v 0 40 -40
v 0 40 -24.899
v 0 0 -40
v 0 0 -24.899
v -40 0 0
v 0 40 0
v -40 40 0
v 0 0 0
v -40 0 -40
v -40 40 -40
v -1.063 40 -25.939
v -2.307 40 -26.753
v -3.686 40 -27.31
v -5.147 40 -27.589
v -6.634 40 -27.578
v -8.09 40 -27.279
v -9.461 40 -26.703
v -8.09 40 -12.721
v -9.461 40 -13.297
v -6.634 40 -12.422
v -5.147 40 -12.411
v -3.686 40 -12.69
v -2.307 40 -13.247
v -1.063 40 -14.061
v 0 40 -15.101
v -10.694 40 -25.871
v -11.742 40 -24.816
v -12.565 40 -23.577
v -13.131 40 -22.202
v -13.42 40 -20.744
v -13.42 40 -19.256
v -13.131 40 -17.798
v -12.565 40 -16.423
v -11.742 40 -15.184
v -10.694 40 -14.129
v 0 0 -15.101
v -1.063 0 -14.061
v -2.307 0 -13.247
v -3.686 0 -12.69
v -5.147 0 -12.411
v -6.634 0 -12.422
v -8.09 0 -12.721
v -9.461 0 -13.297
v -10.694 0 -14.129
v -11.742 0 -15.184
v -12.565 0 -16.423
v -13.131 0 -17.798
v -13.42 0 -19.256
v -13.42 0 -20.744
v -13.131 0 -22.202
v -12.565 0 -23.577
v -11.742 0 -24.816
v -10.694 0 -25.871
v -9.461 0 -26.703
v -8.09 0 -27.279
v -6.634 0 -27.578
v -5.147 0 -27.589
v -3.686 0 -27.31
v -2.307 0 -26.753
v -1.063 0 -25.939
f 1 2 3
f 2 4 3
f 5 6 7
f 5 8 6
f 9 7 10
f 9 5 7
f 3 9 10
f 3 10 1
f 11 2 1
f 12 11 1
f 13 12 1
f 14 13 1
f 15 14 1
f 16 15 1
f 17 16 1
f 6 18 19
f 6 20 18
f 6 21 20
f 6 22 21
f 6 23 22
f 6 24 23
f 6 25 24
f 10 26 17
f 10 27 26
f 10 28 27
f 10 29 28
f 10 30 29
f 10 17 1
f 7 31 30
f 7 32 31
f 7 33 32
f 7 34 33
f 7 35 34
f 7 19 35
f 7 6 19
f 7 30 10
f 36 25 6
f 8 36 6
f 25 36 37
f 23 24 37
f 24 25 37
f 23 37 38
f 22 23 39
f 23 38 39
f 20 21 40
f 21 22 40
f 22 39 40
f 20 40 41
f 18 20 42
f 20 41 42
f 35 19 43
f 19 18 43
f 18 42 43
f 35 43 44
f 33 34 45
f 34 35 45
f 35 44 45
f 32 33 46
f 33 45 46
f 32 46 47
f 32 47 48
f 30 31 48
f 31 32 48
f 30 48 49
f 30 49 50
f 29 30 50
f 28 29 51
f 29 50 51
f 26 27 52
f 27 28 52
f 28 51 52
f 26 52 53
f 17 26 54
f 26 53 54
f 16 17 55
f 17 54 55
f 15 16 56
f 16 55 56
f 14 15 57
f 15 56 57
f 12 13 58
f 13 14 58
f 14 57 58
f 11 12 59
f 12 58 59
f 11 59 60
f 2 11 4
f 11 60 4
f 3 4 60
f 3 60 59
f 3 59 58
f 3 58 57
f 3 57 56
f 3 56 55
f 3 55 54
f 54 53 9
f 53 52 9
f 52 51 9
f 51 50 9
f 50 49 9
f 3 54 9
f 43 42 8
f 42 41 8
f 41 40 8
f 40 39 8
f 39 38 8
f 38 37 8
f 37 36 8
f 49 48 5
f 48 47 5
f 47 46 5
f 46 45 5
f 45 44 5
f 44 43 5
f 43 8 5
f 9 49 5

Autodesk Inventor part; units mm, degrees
ref_plane "YZ Plane" through (0, 0, 0) normal (1, 0, 0) x (0, 1, 0)
ref_plane "XZ Plane" through (0, 0, 0) normal (0, 1, 0) x (-1, 0, 0)
ref_plane "XY Plane" through (0, 0, 0) normal (0, 0, 1) x (1, 0, 0)
sketch "Sketch1" plane through (0, 0, 0) normal (0, 1, 0) x (-1, 0, 0)
  line L0 (0, 0) -> (40, 0)
  line L1 (40, 0) -> (40, -40)
  line L2 (40, -40) -> (0, -40)
  line L3 (0, -15.101) -> (0, 0)
  line L4 (0, -24.899) -> (0, -40)
  arc A0 (0, -24.899) -> (0, -15.101) centre (5.8365, -20) ccw
  dimension "d0" = 40
  dimension "d1" = 40
  dimension "d7" = 7.62
extrude "Extrusion1" add sketch "Sketch1" along normal blind 40
properties part number "railblock"
